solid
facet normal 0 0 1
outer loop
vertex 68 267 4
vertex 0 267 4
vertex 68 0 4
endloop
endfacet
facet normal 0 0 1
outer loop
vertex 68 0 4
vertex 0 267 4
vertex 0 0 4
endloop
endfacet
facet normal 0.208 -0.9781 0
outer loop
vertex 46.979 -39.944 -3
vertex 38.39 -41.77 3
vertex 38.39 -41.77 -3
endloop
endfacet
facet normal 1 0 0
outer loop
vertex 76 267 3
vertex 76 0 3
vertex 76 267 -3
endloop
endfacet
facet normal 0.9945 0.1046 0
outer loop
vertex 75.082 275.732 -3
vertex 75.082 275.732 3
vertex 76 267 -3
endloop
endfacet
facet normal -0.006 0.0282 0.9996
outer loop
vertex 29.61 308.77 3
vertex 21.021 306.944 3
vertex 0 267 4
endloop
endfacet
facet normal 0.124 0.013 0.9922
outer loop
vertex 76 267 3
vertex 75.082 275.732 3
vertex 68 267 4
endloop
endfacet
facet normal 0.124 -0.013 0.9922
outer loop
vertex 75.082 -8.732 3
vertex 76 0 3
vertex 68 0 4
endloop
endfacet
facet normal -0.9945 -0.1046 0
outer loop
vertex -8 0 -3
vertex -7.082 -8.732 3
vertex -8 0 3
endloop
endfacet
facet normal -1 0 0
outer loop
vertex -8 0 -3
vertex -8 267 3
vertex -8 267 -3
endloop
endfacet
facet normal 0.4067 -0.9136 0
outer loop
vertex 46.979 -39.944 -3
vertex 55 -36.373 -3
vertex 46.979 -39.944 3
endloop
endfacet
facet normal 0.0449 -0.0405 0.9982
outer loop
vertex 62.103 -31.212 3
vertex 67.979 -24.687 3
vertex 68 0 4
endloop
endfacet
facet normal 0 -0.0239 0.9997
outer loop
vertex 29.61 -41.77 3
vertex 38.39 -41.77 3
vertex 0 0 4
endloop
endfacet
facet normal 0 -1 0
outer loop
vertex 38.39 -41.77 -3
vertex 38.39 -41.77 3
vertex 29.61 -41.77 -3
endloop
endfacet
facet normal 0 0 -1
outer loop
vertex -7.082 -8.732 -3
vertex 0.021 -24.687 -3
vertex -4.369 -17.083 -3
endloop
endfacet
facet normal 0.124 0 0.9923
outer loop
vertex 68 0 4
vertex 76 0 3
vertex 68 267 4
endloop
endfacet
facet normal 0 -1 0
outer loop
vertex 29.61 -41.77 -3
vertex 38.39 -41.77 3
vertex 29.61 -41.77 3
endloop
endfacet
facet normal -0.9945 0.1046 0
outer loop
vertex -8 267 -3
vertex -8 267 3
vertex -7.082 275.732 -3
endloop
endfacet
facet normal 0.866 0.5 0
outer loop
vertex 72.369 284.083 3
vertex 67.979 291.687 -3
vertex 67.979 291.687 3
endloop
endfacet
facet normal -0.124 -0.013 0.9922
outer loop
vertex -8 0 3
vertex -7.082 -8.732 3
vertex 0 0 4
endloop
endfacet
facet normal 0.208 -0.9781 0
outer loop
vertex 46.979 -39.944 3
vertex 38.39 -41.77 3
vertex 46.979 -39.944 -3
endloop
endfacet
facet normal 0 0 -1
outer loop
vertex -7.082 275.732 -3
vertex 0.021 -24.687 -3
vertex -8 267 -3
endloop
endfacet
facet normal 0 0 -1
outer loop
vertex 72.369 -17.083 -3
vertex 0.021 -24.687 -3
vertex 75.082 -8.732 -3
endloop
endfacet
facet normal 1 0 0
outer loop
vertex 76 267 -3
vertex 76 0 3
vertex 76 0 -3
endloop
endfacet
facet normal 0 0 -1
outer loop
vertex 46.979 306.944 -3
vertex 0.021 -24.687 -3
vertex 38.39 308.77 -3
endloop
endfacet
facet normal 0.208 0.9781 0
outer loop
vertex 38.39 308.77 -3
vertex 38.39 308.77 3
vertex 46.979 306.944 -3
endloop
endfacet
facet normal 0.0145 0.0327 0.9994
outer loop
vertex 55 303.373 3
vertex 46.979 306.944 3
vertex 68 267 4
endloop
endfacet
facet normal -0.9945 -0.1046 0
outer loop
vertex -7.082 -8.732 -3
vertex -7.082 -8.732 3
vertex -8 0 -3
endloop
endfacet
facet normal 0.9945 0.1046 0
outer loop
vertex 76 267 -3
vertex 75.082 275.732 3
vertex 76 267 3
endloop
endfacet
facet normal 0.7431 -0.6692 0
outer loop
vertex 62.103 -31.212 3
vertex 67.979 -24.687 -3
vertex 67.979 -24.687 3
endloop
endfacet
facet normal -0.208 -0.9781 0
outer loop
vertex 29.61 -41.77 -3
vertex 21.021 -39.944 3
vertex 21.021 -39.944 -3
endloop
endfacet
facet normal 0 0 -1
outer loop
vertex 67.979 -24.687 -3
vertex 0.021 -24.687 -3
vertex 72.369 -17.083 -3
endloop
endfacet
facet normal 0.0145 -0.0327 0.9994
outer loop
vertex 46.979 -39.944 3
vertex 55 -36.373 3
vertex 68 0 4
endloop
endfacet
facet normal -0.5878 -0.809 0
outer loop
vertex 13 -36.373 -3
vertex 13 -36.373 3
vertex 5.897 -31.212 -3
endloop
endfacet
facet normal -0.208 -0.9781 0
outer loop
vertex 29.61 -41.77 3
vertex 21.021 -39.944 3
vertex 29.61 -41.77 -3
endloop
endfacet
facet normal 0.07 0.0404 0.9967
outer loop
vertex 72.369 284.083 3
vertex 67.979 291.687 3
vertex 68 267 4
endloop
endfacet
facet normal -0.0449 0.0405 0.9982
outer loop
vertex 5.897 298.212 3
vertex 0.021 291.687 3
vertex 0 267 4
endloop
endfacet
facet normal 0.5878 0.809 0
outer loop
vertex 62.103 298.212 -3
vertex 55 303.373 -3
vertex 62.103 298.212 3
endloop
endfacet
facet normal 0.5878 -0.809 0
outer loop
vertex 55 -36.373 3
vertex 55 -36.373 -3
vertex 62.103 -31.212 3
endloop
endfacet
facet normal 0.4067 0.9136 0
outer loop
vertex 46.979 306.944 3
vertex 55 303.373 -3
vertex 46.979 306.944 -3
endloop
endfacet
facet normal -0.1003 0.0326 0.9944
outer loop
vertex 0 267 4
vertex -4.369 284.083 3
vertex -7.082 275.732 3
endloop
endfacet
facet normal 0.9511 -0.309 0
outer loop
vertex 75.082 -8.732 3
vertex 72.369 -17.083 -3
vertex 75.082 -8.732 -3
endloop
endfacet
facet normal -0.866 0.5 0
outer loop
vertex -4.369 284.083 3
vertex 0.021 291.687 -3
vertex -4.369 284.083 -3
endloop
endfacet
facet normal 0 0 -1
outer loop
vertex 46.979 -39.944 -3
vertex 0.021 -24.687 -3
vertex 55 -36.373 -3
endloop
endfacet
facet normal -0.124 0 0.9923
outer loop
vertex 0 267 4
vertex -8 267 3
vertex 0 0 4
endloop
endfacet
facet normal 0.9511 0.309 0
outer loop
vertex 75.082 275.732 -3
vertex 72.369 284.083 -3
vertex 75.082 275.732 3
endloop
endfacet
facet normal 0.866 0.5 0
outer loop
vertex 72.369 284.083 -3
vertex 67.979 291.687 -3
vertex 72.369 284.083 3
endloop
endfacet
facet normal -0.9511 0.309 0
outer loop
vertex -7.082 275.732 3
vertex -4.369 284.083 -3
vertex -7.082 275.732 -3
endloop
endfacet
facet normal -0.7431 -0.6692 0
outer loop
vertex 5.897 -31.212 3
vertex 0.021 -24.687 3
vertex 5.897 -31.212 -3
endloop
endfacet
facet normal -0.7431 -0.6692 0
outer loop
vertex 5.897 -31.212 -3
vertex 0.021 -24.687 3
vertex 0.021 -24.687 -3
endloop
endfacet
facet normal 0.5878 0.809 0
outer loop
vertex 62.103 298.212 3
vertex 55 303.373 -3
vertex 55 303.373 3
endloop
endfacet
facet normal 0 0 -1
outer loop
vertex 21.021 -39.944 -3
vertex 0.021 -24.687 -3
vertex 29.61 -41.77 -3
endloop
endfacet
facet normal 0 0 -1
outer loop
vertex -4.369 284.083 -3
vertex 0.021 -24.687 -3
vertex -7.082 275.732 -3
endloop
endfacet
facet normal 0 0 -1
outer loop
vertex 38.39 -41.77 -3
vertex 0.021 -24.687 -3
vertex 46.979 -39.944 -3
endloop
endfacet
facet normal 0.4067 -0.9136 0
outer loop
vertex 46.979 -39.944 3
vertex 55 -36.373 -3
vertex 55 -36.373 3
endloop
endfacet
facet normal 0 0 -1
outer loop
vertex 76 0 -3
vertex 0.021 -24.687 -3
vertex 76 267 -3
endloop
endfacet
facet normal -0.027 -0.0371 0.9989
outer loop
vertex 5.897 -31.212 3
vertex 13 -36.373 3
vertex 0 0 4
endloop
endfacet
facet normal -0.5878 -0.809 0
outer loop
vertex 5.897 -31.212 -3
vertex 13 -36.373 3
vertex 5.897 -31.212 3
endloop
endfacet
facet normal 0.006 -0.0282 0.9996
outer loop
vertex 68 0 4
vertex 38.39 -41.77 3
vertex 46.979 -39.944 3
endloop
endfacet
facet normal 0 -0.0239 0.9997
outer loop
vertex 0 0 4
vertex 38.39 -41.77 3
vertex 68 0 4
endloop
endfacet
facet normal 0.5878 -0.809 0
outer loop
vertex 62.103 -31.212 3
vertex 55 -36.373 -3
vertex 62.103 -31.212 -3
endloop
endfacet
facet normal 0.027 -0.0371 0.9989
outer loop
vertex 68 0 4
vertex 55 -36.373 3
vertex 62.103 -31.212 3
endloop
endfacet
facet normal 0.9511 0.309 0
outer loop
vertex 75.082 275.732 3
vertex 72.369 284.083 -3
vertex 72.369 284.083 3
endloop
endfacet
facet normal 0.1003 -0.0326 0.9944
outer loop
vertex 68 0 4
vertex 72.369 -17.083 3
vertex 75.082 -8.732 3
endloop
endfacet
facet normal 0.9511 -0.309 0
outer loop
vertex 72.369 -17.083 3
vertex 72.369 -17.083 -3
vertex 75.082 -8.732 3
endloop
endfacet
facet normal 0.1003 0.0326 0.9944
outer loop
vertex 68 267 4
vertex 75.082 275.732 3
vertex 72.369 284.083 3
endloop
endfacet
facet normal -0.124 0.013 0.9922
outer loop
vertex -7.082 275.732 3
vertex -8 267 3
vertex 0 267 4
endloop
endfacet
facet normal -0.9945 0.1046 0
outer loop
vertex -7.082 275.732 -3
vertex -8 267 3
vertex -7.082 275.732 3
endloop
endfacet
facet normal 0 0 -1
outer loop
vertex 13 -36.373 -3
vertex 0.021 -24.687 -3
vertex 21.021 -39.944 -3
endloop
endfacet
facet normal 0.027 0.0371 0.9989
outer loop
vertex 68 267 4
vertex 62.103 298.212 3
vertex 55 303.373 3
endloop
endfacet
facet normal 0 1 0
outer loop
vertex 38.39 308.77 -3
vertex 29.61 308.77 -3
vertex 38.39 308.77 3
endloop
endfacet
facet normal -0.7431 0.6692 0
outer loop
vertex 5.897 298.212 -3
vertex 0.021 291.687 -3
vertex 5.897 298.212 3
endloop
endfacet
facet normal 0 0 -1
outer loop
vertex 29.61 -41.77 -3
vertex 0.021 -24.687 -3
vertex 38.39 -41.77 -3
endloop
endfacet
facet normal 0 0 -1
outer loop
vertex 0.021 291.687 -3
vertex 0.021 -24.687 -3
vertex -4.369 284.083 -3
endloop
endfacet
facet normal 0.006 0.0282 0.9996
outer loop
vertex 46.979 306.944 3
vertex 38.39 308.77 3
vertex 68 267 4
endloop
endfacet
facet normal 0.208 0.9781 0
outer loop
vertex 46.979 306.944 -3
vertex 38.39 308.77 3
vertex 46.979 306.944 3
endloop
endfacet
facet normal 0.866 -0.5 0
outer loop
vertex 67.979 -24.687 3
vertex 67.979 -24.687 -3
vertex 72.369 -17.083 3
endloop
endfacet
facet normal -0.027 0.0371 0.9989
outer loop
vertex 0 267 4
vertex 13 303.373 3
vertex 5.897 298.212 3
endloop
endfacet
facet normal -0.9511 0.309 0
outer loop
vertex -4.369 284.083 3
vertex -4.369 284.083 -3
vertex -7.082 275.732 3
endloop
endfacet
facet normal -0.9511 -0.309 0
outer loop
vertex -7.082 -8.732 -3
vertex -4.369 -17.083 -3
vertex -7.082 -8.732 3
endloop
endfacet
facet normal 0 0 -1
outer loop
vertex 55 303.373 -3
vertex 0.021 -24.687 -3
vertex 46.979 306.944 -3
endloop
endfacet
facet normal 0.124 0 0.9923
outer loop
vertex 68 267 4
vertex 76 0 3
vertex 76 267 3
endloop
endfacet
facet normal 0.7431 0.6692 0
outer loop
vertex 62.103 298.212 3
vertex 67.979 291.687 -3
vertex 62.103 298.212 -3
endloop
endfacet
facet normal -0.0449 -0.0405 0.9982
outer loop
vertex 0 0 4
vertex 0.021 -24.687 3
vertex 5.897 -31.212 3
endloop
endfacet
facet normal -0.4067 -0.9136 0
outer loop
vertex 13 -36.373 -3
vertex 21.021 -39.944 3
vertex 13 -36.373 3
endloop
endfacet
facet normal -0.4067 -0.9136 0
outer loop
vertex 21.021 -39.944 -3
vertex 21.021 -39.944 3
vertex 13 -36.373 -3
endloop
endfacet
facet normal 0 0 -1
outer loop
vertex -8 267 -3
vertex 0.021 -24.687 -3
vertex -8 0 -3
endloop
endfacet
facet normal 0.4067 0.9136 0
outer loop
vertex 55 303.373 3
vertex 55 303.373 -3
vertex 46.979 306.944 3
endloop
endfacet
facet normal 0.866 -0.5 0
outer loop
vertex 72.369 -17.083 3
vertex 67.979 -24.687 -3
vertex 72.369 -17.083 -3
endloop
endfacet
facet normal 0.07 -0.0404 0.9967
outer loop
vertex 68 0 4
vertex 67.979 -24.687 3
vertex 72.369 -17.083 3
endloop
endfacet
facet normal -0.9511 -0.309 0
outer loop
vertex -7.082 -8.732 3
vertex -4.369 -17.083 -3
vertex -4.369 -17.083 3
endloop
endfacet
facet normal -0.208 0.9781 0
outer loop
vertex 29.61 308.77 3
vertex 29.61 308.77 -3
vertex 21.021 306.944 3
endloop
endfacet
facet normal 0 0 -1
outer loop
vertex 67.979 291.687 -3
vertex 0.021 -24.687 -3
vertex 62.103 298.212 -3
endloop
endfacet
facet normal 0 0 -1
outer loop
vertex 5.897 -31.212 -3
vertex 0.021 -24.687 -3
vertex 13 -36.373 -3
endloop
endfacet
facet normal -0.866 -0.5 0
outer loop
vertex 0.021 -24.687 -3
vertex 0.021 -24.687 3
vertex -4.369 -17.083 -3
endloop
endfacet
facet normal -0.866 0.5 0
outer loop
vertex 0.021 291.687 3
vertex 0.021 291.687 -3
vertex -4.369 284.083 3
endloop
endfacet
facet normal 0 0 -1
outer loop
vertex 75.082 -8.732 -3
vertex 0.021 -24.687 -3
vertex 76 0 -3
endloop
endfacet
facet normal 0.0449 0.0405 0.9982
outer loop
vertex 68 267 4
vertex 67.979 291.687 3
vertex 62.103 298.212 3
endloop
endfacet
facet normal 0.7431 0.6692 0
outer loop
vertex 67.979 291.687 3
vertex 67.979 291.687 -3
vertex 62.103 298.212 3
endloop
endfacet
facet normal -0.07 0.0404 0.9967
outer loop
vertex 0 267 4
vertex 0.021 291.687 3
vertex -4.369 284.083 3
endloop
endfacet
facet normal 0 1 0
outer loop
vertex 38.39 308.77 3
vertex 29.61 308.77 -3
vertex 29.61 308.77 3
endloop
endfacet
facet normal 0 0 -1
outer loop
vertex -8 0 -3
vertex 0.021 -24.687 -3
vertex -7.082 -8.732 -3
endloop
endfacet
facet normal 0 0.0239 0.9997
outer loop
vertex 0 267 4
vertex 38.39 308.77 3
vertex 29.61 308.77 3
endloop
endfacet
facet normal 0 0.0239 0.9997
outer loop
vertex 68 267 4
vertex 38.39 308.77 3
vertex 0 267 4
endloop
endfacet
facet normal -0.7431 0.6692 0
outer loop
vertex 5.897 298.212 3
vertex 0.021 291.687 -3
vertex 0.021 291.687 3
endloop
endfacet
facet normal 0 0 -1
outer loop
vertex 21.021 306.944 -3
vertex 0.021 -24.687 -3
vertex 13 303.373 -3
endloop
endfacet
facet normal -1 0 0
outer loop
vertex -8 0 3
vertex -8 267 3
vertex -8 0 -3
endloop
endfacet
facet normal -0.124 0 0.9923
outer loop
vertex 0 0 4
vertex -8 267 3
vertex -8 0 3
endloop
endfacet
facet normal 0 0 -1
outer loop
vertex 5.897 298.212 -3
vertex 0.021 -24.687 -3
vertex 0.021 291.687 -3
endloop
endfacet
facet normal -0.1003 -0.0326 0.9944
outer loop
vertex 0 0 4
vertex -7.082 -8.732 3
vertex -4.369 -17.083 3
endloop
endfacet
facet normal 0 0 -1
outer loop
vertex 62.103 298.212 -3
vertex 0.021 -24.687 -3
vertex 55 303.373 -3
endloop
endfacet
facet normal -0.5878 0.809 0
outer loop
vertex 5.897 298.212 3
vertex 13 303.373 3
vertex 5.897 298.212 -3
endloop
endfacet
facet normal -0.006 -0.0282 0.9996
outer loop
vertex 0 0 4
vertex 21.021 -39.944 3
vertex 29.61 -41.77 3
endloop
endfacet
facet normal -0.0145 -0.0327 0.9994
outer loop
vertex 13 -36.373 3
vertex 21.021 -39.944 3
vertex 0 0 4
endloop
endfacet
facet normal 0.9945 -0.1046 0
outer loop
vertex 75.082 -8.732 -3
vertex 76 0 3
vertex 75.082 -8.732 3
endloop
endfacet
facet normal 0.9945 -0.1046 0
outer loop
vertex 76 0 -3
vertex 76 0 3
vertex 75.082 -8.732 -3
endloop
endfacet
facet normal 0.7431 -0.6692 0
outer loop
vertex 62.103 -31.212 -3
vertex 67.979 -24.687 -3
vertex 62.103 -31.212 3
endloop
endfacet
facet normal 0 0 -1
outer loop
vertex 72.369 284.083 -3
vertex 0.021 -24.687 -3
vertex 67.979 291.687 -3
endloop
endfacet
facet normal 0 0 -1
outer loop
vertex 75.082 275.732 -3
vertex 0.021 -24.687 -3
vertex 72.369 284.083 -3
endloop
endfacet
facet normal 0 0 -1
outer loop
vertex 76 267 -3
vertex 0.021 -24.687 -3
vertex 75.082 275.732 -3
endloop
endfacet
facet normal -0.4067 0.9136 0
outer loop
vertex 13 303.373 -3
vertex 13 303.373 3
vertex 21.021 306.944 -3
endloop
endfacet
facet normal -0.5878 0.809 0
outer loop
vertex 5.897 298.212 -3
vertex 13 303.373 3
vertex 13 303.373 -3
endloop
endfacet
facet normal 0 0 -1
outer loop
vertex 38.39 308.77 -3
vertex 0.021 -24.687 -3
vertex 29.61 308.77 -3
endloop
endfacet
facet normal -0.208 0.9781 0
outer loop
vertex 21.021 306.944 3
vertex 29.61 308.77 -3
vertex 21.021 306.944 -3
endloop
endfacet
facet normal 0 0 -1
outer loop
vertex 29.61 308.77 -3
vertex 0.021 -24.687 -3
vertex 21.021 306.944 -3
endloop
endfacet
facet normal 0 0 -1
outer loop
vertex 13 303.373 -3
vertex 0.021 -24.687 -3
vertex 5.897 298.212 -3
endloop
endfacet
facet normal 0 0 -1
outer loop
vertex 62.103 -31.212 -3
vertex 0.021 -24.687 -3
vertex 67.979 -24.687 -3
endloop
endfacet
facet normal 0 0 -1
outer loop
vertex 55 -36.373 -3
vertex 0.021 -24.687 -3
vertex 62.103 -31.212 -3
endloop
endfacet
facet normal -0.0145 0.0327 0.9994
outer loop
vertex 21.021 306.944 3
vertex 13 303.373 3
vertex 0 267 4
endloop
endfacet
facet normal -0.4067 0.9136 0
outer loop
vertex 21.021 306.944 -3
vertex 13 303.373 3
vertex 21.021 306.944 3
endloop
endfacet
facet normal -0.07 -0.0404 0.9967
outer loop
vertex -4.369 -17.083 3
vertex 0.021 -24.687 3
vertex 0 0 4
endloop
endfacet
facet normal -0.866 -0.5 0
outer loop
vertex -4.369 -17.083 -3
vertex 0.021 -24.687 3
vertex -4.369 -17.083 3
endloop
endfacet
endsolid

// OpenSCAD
// Clock design by BananaC9 / Juan García

PCB_HEIGHT = 68; // Size of PCB in mm
PCB_WIDTH = 267; // Size of PCB in mm267
NUMBER_LEDS_HORIZONTAL=32; // Number of Leds in a row
NUMBER_LEDS_VERTICAL=8;   // Number of Leds in a column
DIFFUSER_HEIGHT = 4; // Height of diffuser
LED_SIZE = 5; // Size of leds in mm
DISTANCE_BETWEEN_LEDS=3.3; // Distance between leds in mm
WALL_THICKNESS=1; // Thinkess of walls
PCB_BORDER = 1;  // PCB Outer Boarder in mm
ROUNDED_END_RADIUS = 35;
buffer=DISTANCE_BETWEEN_LEDS-WALL_THICKNESS;
THICK_BORDER = PCB_BORDER - WALL_THICKNESS;


difference() {

// Create Main PCB Diffuser
    union() {
        hull() {
            cube([PCB_HEIGHT, PCB_WIDTH, DIFFUSER_HEIGHT]);
            translate([PCB_HEIGHT/2, 0, 0]) cylinder(h = DIFFUSER_HEIGHT + 2, r = ROUNDED_END_RADIUS * 1.2, center = true);
            translate([PCB_HEIGHT - ROUNDED_END_RADIUS, 0, 0]) cylinder(h = DIFFUSER_HEIGHT, r = ROUNDED_END_RADIUS, center = true);
            translate([PCB_HEIGHT/2, PCB_WIDTH, 0]) cylinder(h = DIFFUSER_HEIGHT + 2, r = ROUNDED_END_RADIUS * 1.2, center = true);
        }
    }
 
/*   
    // split to print in small printer
translate([-50,-ROUNDED_END_RADIUS*1.2, -DIFFUSER_HEIGHT-1]) {
    cube([PCB_HEIGHT*2, PCB_WIDTH/2+33, DIFFUSER_HEIGHT*5]);
    }
// split to print in small printer
translate([-50, PCB_WIDTH/2-9, -DIFFUSER_HEIGHT-1]) {
    cube([PCB_HEIGHT*2, PCB_WIDTH, DIFFUSER_HEIGHT*5]);
}
*/
}
